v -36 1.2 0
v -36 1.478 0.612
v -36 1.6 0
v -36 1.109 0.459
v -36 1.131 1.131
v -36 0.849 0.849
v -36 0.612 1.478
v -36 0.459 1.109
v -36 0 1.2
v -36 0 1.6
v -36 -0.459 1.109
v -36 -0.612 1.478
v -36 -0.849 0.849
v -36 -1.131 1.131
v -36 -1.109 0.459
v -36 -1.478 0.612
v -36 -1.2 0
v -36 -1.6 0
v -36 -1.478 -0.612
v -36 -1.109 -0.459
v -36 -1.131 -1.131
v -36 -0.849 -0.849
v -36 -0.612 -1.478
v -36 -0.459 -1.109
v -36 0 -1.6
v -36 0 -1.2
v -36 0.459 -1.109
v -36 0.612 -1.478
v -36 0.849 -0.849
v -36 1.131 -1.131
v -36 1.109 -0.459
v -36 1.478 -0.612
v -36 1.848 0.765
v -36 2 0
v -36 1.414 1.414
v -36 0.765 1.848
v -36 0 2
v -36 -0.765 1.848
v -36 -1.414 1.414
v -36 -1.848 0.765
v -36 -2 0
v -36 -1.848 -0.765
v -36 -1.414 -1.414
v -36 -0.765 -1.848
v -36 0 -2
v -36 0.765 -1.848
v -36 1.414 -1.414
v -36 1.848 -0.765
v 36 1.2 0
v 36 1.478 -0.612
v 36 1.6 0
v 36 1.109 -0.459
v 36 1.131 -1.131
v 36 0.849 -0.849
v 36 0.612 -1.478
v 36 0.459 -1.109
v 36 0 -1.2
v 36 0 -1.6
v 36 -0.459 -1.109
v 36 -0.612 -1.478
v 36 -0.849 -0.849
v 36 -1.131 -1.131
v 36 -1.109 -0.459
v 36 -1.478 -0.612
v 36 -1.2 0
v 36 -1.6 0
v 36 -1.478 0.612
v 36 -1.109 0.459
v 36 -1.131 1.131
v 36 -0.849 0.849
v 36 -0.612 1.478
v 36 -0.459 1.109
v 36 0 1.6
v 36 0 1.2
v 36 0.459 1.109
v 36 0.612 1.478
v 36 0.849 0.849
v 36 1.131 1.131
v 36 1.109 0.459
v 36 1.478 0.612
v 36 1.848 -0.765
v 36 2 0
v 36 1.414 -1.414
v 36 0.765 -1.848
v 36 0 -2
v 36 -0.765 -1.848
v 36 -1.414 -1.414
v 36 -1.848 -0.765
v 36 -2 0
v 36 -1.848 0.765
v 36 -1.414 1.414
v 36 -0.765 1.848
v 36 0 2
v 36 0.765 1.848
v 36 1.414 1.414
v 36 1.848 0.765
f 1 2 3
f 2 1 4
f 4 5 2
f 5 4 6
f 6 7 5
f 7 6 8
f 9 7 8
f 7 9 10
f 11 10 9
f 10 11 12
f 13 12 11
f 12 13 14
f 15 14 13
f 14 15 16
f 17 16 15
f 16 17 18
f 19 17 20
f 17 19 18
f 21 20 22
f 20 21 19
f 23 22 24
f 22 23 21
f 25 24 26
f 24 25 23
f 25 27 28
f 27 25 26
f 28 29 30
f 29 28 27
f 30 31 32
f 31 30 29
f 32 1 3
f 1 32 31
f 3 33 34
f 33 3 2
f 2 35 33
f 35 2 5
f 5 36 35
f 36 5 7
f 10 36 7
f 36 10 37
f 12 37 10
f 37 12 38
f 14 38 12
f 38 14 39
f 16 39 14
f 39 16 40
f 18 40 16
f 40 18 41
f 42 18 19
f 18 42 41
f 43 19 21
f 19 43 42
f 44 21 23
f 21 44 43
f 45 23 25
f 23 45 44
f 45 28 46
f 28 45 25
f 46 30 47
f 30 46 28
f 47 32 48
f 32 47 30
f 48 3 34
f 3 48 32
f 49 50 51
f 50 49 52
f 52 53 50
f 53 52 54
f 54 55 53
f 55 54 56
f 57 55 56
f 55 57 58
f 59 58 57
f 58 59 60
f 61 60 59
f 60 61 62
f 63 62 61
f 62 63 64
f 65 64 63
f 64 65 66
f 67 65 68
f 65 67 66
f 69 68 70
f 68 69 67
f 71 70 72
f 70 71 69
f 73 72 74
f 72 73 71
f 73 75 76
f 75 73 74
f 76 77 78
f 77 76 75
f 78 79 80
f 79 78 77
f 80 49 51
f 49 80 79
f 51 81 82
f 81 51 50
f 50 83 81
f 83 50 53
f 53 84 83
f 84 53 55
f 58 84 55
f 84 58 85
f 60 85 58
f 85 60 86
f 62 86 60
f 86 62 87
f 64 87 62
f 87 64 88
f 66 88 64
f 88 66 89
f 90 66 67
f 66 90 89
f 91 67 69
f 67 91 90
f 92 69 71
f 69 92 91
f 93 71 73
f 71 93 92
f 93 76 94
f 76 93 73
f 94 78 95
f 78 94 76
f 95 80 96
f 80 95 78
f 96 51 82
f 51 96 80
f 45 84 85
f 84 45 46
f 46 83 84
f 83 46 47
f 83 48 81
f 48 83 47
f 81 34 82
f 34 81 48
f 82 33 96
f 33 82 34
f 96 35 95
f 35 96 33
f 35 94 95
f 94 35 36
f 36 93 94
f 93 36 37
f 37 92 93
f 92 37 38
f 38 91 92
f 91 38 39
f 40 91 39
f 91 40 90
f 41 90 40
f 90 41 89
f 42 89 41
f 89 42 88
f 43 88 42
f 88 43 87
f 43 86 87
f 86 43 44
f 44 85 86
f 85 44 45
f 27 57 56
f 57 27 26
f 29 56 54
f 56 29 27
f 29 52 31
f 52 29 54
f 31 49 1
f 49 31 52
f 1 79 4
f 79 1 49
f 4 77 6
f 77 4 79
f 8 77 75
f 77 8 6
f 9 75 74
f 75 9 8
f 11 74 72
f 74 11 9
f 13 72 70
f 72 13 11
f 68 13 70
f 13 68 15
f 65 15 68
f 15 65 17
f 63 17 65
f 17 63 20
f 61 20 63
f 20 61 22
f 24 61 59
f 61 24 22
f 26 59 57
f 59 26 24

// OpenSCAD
// file: ../p/4-4disc.scad
use <../lib.scad>
$fa=1; $fs=0.2;
function ldraw_lib__4_4disc(realsolid=false) = [
// 0 Disc 1.0
// 0 Name: 4-4disc.dat
// 0 Author: James Jessiman
// 0 !LDRAW_ORG Primitive UPDATE 2002-02
// 0 !LICENSE Licensed under CC BY 2.0 and CC BY 4.0 : see CAreadme.txt
// 
// 0 BFC CERTIFY CCW
  [0,"BFC","CERTIFY"],
  [0,"BFC","CCW"],
// 
// 0 !HISTORY 1998-12-15 [PTadmin] Official Update 1998-10
// 0 !HISTORY 2002-03-23 [sbliss] Added BFC statement
// 0 !HISTORY 2002-04-25 [PTadmin] Official Update 2002-02
// 0 !HISTORY 2007-06-24 [PTadmin] Header formatted for Contributor Agreement
// 0 !HISTORY 2008-07-01 [PTadmin] Official Update 2008-01
// 
// 
// 3 16 0 0 0 1 0 0 0.9239 0 0.3827
  [3,16,0,0,0,1,0,0,0.9239,0,0.3827],
// 3 16 0 0 0 0.9239 0 0.3827 0.7071 0 0.7071
  [3,16,0,0,0,0.9239,0,0.3827,0.7071,0,0.7071],
// 3 16 0 0 0 0.7071 0 0.7071 0.3827 0 0.9239
  [3,16,0,0,0,0.7071,0,0.7071,0.3827,0,0.9239],
// 3 16 0 0 0 0.3827 0 0.9239 0 0 1
  [3,16,0,0,0,0.3827,0,0.9239,0,0,1],
// 3 16 0 0 0 0 0 1 -0.3827 0 0.9239
  [3,16,0,0,0,0,0,1,-0.3827,0,0.9239],
// 3 16 0 0 0 -0.3827 0 0.9239 -0.7071 0 0.7071
  [3,16,0,0,0,-0.3827,0,0.9239,-0.7071,0,0.7071],
// 3 16 0 0 0 -0.7071 0 0.7071 -0.9239 0 0.3827
  [3,16,0,0,0,-0.7071,0,0.7071,-0.9239,0,0.3827],
// 3 16 0 0 0 -0.9239 0 0.3827 -1 0 -0
  [3,16,0,0,0,-0.9239,0,0.3827,-1,0,-0],
// 3 16 0 0 0 -1 0 -0 -0.9239 0 -0.3827
  [3,16,0,0,0,-1,0,-0,-0.9239,0,-0.3827],
// 3 16 0 0 0 -0.9239 0 -0.3827 -0.7071 0 -0.7071
  [3,16,0,0,0,-0.9239,0,-0.3827,-0.7071,0,-0.7071],
// 3 16 0 0 0 -0.7071 0 -0.7071 -0.3827 0 -0.9239
  [3,16,0,0,0,-0.7071,0,-0.7071,-0.3827,0,-0.9239],
// 3 16 0 0 0 -0.3827 0 -0.9239 0 0 -1
  [3,16,0,0,0,-0.3827,0,-0.9239,0,0,-1],
// 3 16 0 0 0 0 0 -1 0.3827 0 -0.9239
  [3,16,0,0,0,0,0,-1,0.3827,0,-0.9239],
// 3 16 0 0 0 0.3827 0 -0.9239 0.7071 0 -0.7071
  [3,16,0,0,0,0.3827,0,-0.9239,0.7071,0,-0.7071],
// 3 16 0 0 0 0.7071 0 -0.7071 0.9239 0 -0.3827
  [3,16,0,0,0,0.7071,0,-0.7071,0.9239,0,-0.3827],
// 3 16 0 0 0 0.9239 0 -0.3827 1 0 0
  [3,16,0,0,0,0.9239,0,-0.3827,1,0,0],
// 0
];
module ldraw_lib__4_4disc(step=0, col=false, unit=2/5, alt=false, line=0.2, solid=!$preview)
    makepoly(ldraw_lib__4_4disc(solid), step=step, col=col, unit=unit, alt=alt, line=line, solid=solid);
ldraw_lib__4_4disc(line=0.2);
// file: ../p/stud3.scad
use <../lib.scad>
use <4-4cyli.scad>
use <4-4disc.scad>
use <4-4edge.scad>
$fa=1; $fs=0.2;
function ldraw_lib__stud3(realsolid=false) = realsolid ? 
    [openscad(translate([0,0,-eps()], o=cylinder(4+eps(), r=4)),2)] : [
// 0 Stud Tube Solid
// 0 Name: stud3.dat
// 0 Author: James Jessiman
// 0 !LDRAW_ORG Primitive UPDATE 2012-01
// 0 !LICENSE Licensed under CC BY 2.0 and CC BY 4.0 : see CAreadme.txt
// 
// 0 BFC CERTIFY CCW
  [0,"BFC","CERTIFY"],
  [0,"BFC","CCW"],
// 
// 0 !HISTORY 2002-04-04 [sbliss] Modified for BFC compliance
// 0 !HISTORY 2002-04-25 [PTadmin] Official Update 2002-02
// 0 !HISTORY 2007-06-24 [PTadmin] Header formatted for Contributor Agreement
// 0 !HISTORY 2008-07-01 [PTadmin] Official Update 2008-01
// 0 !HISTORY 2012-02-16 [Philo] Changed to CCW
// 0 !HISTORY 2012-03-30 [PTadmin] Official Update 2012-01
// 
// 
// 1 16 0 -4 0 4 0 0 0 1 0 0 0 4 4-4edge.dat
  [1,16,0,-4,0,4,0,0,0,1,0,0,0,4, ldraw_lib__4_4edge(realsolid)],
// 1 16 0 0 0 4 0 0 0 1 0 0 0 4 4-4edge.dat
  [1,16,0,0,0,4,0,0,0,1,0,0,0,4, ldraw_lib__4_4edge(realsolid)],
// 1 16 0 -4 0 4 0 0 0 1 0 0 0 4 4-4disc.dat
  [1,16,0,-4,0,4,0,0,0,1,0,0,0,4, ldraw_lib__4_4disc(realsolid)],
// 1 16 0 -4 0 4 0 0 0 4 0 0 0 4 4-4cyli.dat
  [1,16,0,-4,0,4,0,0,0,4,0,0,0,4, ldraw_lib__4_4cyli(realsolid)],
];
module ldraw_lib__stud3(step=0, col=false, unit=2/5, alt=false, line=0.2, solid=!$preview)
    makepoly(ldraw_lib__stud3(solid), step=step, col=col, unit=unit, alt=alt, line=line, solid=solid);
ldraw_lib__stud3(line=0.2);
// file: ../p/stud.scad
use <../lib.scad>
use <4-4cyli.scad>
use <4-4disc.scad>
use <4-4edge.scad>
$fa=1; $fs=0.2;
function ldraw_lib__stud(realsolid=false) = realsolid ? 
    [openscad(translate([0,0,-eps()], o=cylinder(4+eps(), r=6)),2)] : [
// 0 Stud
// 0 Name: stud.dat
// 0 Author: James Jessiman
// 0 !LDRAW_ORG Primitive UPDATE 2012-01
// 0 !LICENSE Licensed under CC BY 2.0 and CC BY 4.0 : see CAreadme.txt
// 
// 0 BFC CERTIFY CCW
  [0,"BFC","CERTIFY"],
  [0,"BFC","CCW"],
// 
// 0 !HISTORY 2002-04-04 [sbliss] Modified for BFC compliance
// 0 !HISTORY 2002-04-25 [PTadmin] Official Update 2002-02
// 0 !HISTORY 2007-06-24 [PTadmin] Header formatted for Contributor Agreement
// 0 !HISTORY 2008-07-01 [PTadmin] Official Update 2008-01
// 0 !HISTORY 2012-02-16 [Philo] Changed to CCW
// 0 !HISTORY 2012-03-30 [PTadmin] Official Update 2012-01
// 
// 
// 1 16 0 0 0 6 0 0 0 1 0 0 0 6 4-4edge.dat
  [1,16,0,0,0,6,0,0,0,1,0,0,0,6, ldraw_lib__4_4edge(realsolid)],
// 1 16 0 -4 0 6 0 0 0 1 0 0 0 6 4-4edge.dat
  [1,16,0,-4,0,6,0,0,0,1,0,0,0,6, ldraw_lib__4_4edge(realsolid)],
// 1 16 0 0 0 6 0 0 0 -4 0 0 0 6 4-4cyli.dat
  [1,16,0,0,0,6,0,0,0,-4,0,0,0,6, ldraw_lib__4_4cyli(realsolid)],
// 1 16 0 -4 0 6 0 0 0 1 0 0 0 6 4-4disc.dat
  [1,16,0,-4,0,6,0,0,0,1,0,0,0,6, ldraw_lib__4_4disc(realsolid)],
];
module ldraw_lib__stud(step=0, col=false, unit=2/5, alt=false, line=0.2, solid=!$preview)
    makepoly(ldraw_lib__stud(solid), step=step, col=col, unit=unit, alt=alt, line=line, solid=solid);
ldraw_lib__stud(line=0.2);
// file: ../p/box5.scad
use <../lib.scad>
$fa=1; $fs=0.2;
function ldraw_lib__box5(realsolid=false) = [
// 0 Box with 5 Faces and All Edges
// 0 Name: box5.dat
// 0 Author: James Jessiman
// 0 !LDRAW_ORG Primitive UPDATE 2012-01
// 0 !LICENSE Licensed under CC BY 2.0 and CC BY 4.0 : see CAreadme.txt
// 
// 0 BFC CERTIFY CCW
  [0,"BFC","CERTIFY"],
  [0,"BFC","CCW"],
// 
// 0 !HISTORY 2002-04-03 [sbliss] Modified for BFC compliance
// 0 !HISTORY 2002-04-25 [PTadmin] Official Update 2002-02
// 0 !HISTORY 2007-06-24 [PTadmin] Header formatted for Contributor Agreement
// 0 !HISTORY 2008-07-01 [PTadmin] Official Update 2008-01
// 0 !HISTORY 2012-02-16 [Philo] Changed to CCW
// 0 !HISTORY 2012-03-30 [PTadmin] Official Update 2012-01
// 
// 
// 2 24 1 1 1 -1 1 1
  [2,24,1,1,1,-1,1,1],
// 2 24 -1 1 1 -1 1 -1
  [2,24,-1,1,1,-1,1,-1],
// 2 24 -1 1 -1 1 1 -1
  [2,24,-1,1,-1,1,1,-1],
// 2 24 1 1 -1 1 1 1
  [2,24,1,1,-1,1,1,1],
// 2 24 1 0 1 -1 0 1
  [2,24,1,0,1,-1,0,1],
// 2 24 -1 0 1 -1 0 -1
  [2,24,-1,0,1,-1,0,-1],
// 2 24 -1 0 -1 1 0 -1
  [2,24,-1,0,-1,1,0,-1],
// 2 24 1 0 -1 1 0 1
  [2,24,1,0,-1,1,0,1],
// 2 24 1 0 1 1 1 1
  [2,24,1,0,1,1,1,1],
// 2 24 -1 0 1 -1 1 1
  [2,24,-1,0,1,-1,1,1],
// 2 24 1 0 -1 1 1 -1
  [2,24,1,0,-1,1,1,-1],
// 2 24 -1 0 -1 -1 1 -1
  [2,24,-1,0,-1,-1,1,-1],
// 4 16 -1 1 1 1 1 1 1 1 -1 -1 1 -1
  [4,16,-1,1,1,1,1,1,1,1,-1,-1,1,-1],
// 4 16 -1 1 1 -1 0 1 1 0 1 1 1 1
  [4,16,-1,1,1,-1,0,1,1,0,1,1,1,1],
// 4 16 -1 1 -1 -1 0 -1 -1 0 1 -1 1 1
  [4,16,-1,1,-1,-1,0,-1,-1,0,1,-1,1,1],
// 4 16 1 1 -1 1 0 -1 -1 0 -1 -1 1 -1
  [4,16,1,1,-1,1,0,-1,-1,0,-1,-1,1,-1],
// 4 16 1 1 1 1 0 1 1 0 -1 1 1 -1
  [4,16,1,1,1,1,0,1,1,0,-1,1,1,-1],
];
module ldraw_lib__box5(step=0, col=false, unit=2/5, alt=false, line=0.2, solid=!$preview)
    makepoly(ldraw_lib__box5(solid), step=step, col=col, unit=unit, alt=alt, line=line, solid=solid);
ldraw_lib__box5(line=0.2);
// file: ../p/box4t.scad
use <../lib.scad>
$fa=1; $fs=0.2;
function ldraw_lib__box4t(realsolid=false) = [
// 0 Box with 4 Adjacent Faces and All Edges
// 0 Name: box4t.dat
// 0 Author: Tore Eriksson [Tore_Eriksson]
// 0 !LDRAW_ORG Primitive UPDATE 2003-02
// 0 !LICENSE Licensed under CC BY 2.0 and CC BY 4.0 : see CAreadme.txt
// 
// 0 BFC CERTIFY CCW
  [0,"BFC","CERTIFY"],
  [0,"BFC","CCW"],
// 
// 0 !HISTORY 1997-09-29 [PTadmin] Official Update 1997-15
// 0 !HISTORY 2002-08-31 [izanette] Modified with WINDZ for BFC compliance
// 0 !HISTORY 2003-08-01 [PTadmin] Official Update 2003-02
// 0 !HISTORY 2007-06-24 [PTadmin] Header formatted for Contributor Agreement
// 0 !HISTORY 2008-07-01 [PTadmin] Official Update 2008-01
// 
// 
// 2 24 1 1 1 -1 1 1
  [2,24,1,1,1,-1,1,1],
// 2 24 -1 1 1 -1 1 -1
  [2,24,-1,1,1,-1,1,-1],
// 2 24 -1 1 -1 1 1 -1
  [2,24,-1,1,-1,1,1,-1],
// 2 24 1 1 -1 1 1 1
  [2,24,1,1,-1,1,1,1],
// 2 24 1 0 1 -1 0 1
  [2,24,1,0,1,-1,0,1],
// 2 24 -1 0 1 -1 0 -1
  [2,24,-1,0,1,-1,0,-1],
// 2 24 -1 0 -1 1 0 -1
  [2,24,-1,0,-1,1,0,-1],
// 2 24 1 0 -1 1 0 1
  [2,24,1,0,-1,1,0,1],
// 2 24 1 0 1 1 1 1
  [2,24,1,0,1,1,1,1],
// 2 24 -1 0 1 -1 1 1
  [2,24,-1,0,1,-1,1,1],
// 2 24 1 0 -1 1 1 -1
  [2,24,1,0,-1,1,1,-1],
// 2 24 -1 0 -1 -1 1 -1
  [2,24,-1,0,-1,-1,1,-1],
// 4 16 1 1 1 1 1 -1 -1 1 -1 -1 1 1
  [4,16,1,1,1,1,1,-1,-1,1,-1,-1,1,1],
// 4 16 1 1 1 -1 1 1 -1 0 1 1 0 1
  [4,16,1,1,1,-1,1,1,-1,0,1,1,0,1],
// 4 16 -1 1 1 -1 1 -1 -1 0 -1 -1 0 1
  [4,16,-1,1,1,-1,1,-1,-1,0,-1,-1,0,1],
// 0 4 16 -1 1 -1 -1 0 -1 1 0 -1 1 1 -1
// 4 16 1 1 -1 1 1 1 1 0 1 1 0 -1
  [4,16,1,1,-1,1,1,1,1,0,1,1,0,-1],
// 0
];
module ldraw_lib__box4t(step=0, col=false, unit=2/5, alt=false, line=0.2, solid=!$preview)
    makepoly(ldraw_lib__box4t(solid), step=step, col=col, unit=unit, alt=alt, line=line, solid=solid);
ldraw_lib__box4t(line=0.2);
// file: s/3004s01.scad
use <../../lib.scad>
use <../../p/box4t.scad>
use <../../p/box5.scad>
use <../../p/stud.scad>
use <../../p/stud3.scad>
$fa=1; $fs=0.2;
function ldraw_lib__s__3004s01(realsolid=false) = [
// 0 ~Brick  1 x  2 without Front Face
// 0 Name: s\3004s01.dat
// 0 Author: James Jessiman
// 0 !LDRAW_ORG Subpart UPDATE 2003-03
// 0 !LICENSE Licensed under CC BY 2.0 and CC BY 4.0 : see CAreadme.txt
// 
// 0 BFC CERTIFY CCW
  [0,"BFC","CERTIFY"],
  [0,"BFC","CCW"],
// 
// 0 !HISTORY 2003-09-07 [jriley] Subfiling, BFC
// 0 !HISTORY 2003-12-19 [PTadmin] Official Update 2003-03
// 0 !HISTORY 2007-08-29 [PTadmin] Header formatted for Contributor Agreement
// 0 !HISTORY 2008-07-01 [PTadmin] Official Update 2008-01
// 
// 
// 1 16 0 4 0 1 0 0 0 -5 0 0 0 1 stud3.dat
  [1,16,0,4,0,1,0,0,0,-5,0,0,0,1, ldraw_lib__stud3(realsolid)],
// 0 BFC INVERTNEXT
  [0,"BFC","INVERTNEXT"],
// 1 16 0 24 0 16 0 0 0 -20 0 0 0 6 box5.dat
  [1,16,0,24,0,16,0,0,0,-20,0,0,0,6, ldraw_lib__box5(realsolid)],
// 4 16 20 24 10 16 24 6 -16 24 6 -20 24 10
  [4,16,20,24,10,16,24,6,-16,24,6,-20,24,10],
// 4 16 -20 24 10 -16 24 6 -16 24 -6 -20 24 -10
  [4,16,-20,24,10,-16,24,6,-16,24,-6,-20,24,-10],
// 4 16 -20 24 -10 -16 24 -6 16 24 -6 20 24 -10
  [4,16,-20,24,-10,-16,24,-6,16,24,-6,20,24,-10],
// 4 16 20 24 -10 16 24 -6 16 24 6 20 24 10
  [4,16,20,24,-10,16,24,-6,16,24,6,20,24,10],
// 1 16 0 24 0 20 0 0 0 -24 0 0 0 10 box4t.dat
  [1,16,0,24,0,20,0,0,0,-24,0,0,0,10, ldraw_lib__box4t(realsolid)],
// 1 16 10 0 0 1 0 0 0 1 0 0 0 1 stud.dat
  [1,16,10,0,0,1,0,0,0,1,0,0,0,1, ldraw_lib__stud(realsolid)],
// 1 16 -10 0 0 1 0 0 0 1 0 0 0 1 stud.dat
  [1,16,-10,0,0,1,0,0,0,1,0,0,0,1, ldraw_lib__stud(realsolid)],
// 0
];
module ldraw_lib__s__3004s01(step=0, col=false, unit=2/5, alt=false, line=0.2, solid=!$preview)
    makepoly(ldraw_lib__s__3004s01(solid), step=step, col=col, unit=unit, alt=alt, line=line, solid=solid);
ldraw_lib__s__3004s01(line=0.2);
// file: ../p/4-4cyli.scad
use <../lib.scad>
$fa=1; $fs=0.2;
function ldraw_lib__4_4cyli(realsolid=false) = [
// 0 Cylinder 1.0
// 0 Name: 4-4cyli.dat
// 0 Author: James Jessiman
// 0 !LDRAW_ORG Primitive UPDATE 2005-01
// 0 !LICENSE Licensed under CC BY 2.0 and CC BY 4.0 : see CAreadme.txt
// 
// 0 BFC CERTIFY CCW
  [0,"BFC","CERTIFY"],
  [0,"BFC","CCW"],
// 
// 0 !HISTORY 1998-12-15 [PTadmin] Official Update 1998-10
// 0 !HISTORY 2002-03-23 [sbliss] Added BFC statement; merged headers from files in distributions LDraw 0.27 and Complete.
// 0 !HISTORY 2002-04-25 [PTadmin] Official Update 2002-02
// 0 !HISTORY 2004-12-14 [guyvivan] BFC CCW
// 0 !HISTORY 2005-12-28 [PTadmin] Official Update 2005-01
// 0 !HISTORY 2007-06-24 [PTadmin] Header formatted for Contributor Agreement
// 0 !HISTORY 2008-07-01 [PTadmin] Official Update 2008-01
// 
// 
// 4 16 1 1 0 0.9239 1 0.3827 0.9239 0 0.3827 1 0 0
  [4,16,1,1,0,0.9239,1,0.3827,0.9239,0,0.3827,1,0,0],
// 5 24 1 0 0 1 1 0 0.9239 0 0.3827 0.9239 0 -0.3827
  [5,24,1,0,0,1,1,0,0.9239,0,0.3827,0.9239,0,-0.3827],
// 4 16 0.9239 1 0.3827 0.7071 1 0.7071 0.7071 0 0.7071 0.9239 0 0.3827
  [4,16,0.9239,1,0.3827,0.7071,1,0.7071,0.7071,0,0.7071,0.9239,0,0.3827],
// 5 24 0.9239 0 0.3827 0.9239 1 0.3827 0.7071 0 0.7071 1 0 0
  [5,24,0.9239,0,0.3827,0.9239,1,0.3827,0.7071,0,0.7071,1,0,0],
// 4 16 0.7071 1 0.7071 0.3827 1 0.9239 0.3827 0 0.9239 0.7071 0 0.7071
  [4,16,0.7071,1,0.7071,0.3827,1,0.9239,0.3827,0,0.9239,0.7071,0,0.7071],
// 5 24 0.7071 0 0.7071 0.7071 1 0.7071 0.3827 0 0.9239 0.9239 0 0.3827
  [5,24,0.7071,0,0.7071,0.7071,1,0.7071,0.3827,0,0.9239,0.9239,0,0.3827],
// 4 16 0.3827 1 0.9239 0 1 1 0 0 1 0.3827 0 0.9239
  [4,16,0.3827,1,0.9239,0,1,1,0,0,1,0.3827,0,0.9239],
// 5 24 0.3827 0 0.9239 0.3827 1 0.9239 0 0 1 0.7071 0 0.7071
  [5,24,0.3827,0,0.9239,0.3827,1,0.9239,0,0,1,0.7071,0,0.7071],
// 4 16 0 1 1 -0.3827 1 0.9239 -0.3827 0 0.9239 0 0 1
  [4,16,0,1,1,-0.3827,1,0.9239,-0.3827,0,0.9239,0,0,1],
// 5 24 0 0 1 0 1 1 -0.3827 0 0.9239 0.3827 0 0.9239
  [5,24,0,0,1,0,1,1,-0.3827,0,0.9239,0.3827,0,0.9239],
// 4 16 -0.3827 1 0.9239 -0.7071 1 0.7071 -0.7071 0 0.7071 -0.3827 0 0.9239
  [4,16,-0.3827,1,0.9239,-0.7071,1,0.7071,-0.7071,0,0.7071,-0.3827,0,0.9239],
// 5 24 -0.3827 0 0.9239 -0.3827 1 0.9239 -0.7071 0 0.7071 0 0 1
  [5,24,-0.3827,0,0.9239,-0.3827,1,0.9239,-0.7071,0,0.7071,0,0,1],
// 4 16 -0.7071 1 0.7071 -0.9239 1 0.3827 -0.9239 0 0.3827 -0.7071 0 0.7071
  [4,16,-0.7071,1,0.7071,-0.9239,1,0.3827,-0.9239,0,0.3827,-0.7071,0,0.7071],
// 5 24 -0.7071 0 0.7071 -0.7071 1 0.7071 -0.9239 0 0.3827 -0.3827 0 0.9239
  [5,24,-0.7071,0,0.7071,-0.7071,1,0.7071,-0.9239,0,0.3827,-0.3827,0,0.9239],
// 4 16 -0.9239 1 0.3827 -1 1 0 -1 0 0 -0.9239 0 0.3827
  [4,16,-0.9239,1,0.3827,-1,1,0,-1,0,0,-0.9239,0,0.3827],
// 5 24 -0.9239 0 0.3827 -0.9239 1 0.3827 -1 0 0 -0.7071 0 0.7071
  [5,24,-0.9239,0,0.3827,-0.9239,1,0.3827,-1,0,0,-0.7071,0,0.7071],
// 4 16 -1 1 0 -0.9239 1 -0.3827 -0.9239 0 -0.3827 -1 0 0
  [4,16,-1,1,0,-0.9239,1,-0.3827,-0.9239,0,-0.3827,-1,0,0],
// 5 24 -1 0 0 -1 1 0 -0.9239 0 -0.3827 -0.9239 0 0.3827
  [5,24,-1,0,0,-1,1,0,-0.9239,0,-0.3827,-0.9239,0,0.3827],
// 4 16 -0.9239 1 -0.3827 -0.7071 1 -0.7071 -0.7071 0 -0.7071 -0.9239 0 -0.3827
  [4,16,-0.9239,1,-0.3827,-0.7071,1,-0.7071,-0.7071,0,-0.7071,-0.9239,0,-0.3827],
// 5 24 -0.9239 0 -0.3827 -0.9239 1 -0.3827 -0.7071 0 -0.7071 -1 0 0
  [5,24,-0.9239,0,-0.3827,-0.9239,1,-0.3827,-0.7071,0,-0.7071,-1,0,0],
// 4 16 -0.7071 1 -0.7071 -0.3827 1 -0.9239 -0.3827 0 -0.9239 -0.7071 0 -0.7071
  [4,16,-0.7071,1,-0.7071,-0.3827,1,-0.9239,-0.3827,0,-0.9239,-0.7071,0,-0.7071],
// 5 24 -0.7071 0 -0.7071 -0.7071 1 -0.7071 -0.3827 0 -0.9239 -0.9239 0 -0.3827
  [5,24,-0.7071,0,-0.7071,-0.7071,1,-0.7071,-0.3827,0,-0.9239,-0.9239,0,-0.3827],
// 4 16 -0.3827 1 -0.9239 0 1 -1 0 0 -1 -0.3827 0 -0.9239
  [4,16,-0.3827,1,-0.9239,0,1,-1,0,0,-1,-0.3827,0,-0.9239],
// 5 24 -0.3827 0 -0.9239 -0.3827 1 -0.9239 0 0 -1 -0.7071 0 -0.7071
  [5,24,-0.3827,0,-0.9239,-0.3827,1,-0.9239,0,0,-1,-0.7071,0,-0.7071],
// 4 16 0 1 -1 0.3827 1 -0.9239 0.3827 0 -0.9239 0 0 -1
  [4,16,0,1,-1,0.3827,1,-0.9239,0.3827,0,-0.9239,0,0,-1],
// 5 24 0 0 -1 0 1 -1 0.3827 0 -0.9239 -0.3827 0 -0.9239
  [5,24,0,0,-1,0,1,-1,0.3827,0,-0.9239,-0.3827,0,-0.9239],
// 4 16 0.3827 1 -0.9239 0.7071 1 -0.7071 0.7071 0 -0.7071 0.3827 0 -0.9239
  [4,16,0.3827,1,-0.9239,0.7071,1,-0.7071,0.7071,0,-0.7071,0.3827,0,-0.9239],
// 5 24 0.3827 0 -0.9239 0.3827 1 -0.9239 0.7071 0 -0.7071 0 0 -1
  [5,24,0.3827,0,-0.9239,0.3827,1,-0.9239,0.7071,0,-0.7071,0,0,-1],
// 4 16 0.7071 1 -0.7071 0.9239 1 -0.3827 0.9239 0 -0.3827 0.7071 0 -0.7071
  [4,16,0.7071,1,-0.7071,0.9239,1,-0.3827,0.9239,0,-0.3827,0.7071,0,-0.7071],
// 5 24 0.7071 0 -0.7071 0.7071 1 -0.7071 0.9239 0 -0.3827 0.3827 0 -0.9239
  [5,24,0.7071,0,-0.7071,0.7071,1,-0.7071,0.9239,0,-0.3827,0.3827,0,-0.9239],
// 4 16 0.9239 1 -0.3827 1 1 0 1 0 0 0.9239 0 -0.3827
  [4,16,0.9239,1,-0.3827,1,1,0,1,0,0,0.9239,0,-0.3827],
// 5 24 0.9239 0 -0.3827 0.9239 1 -0.3827 1 0 0 0.7071 0 -0.7071
  [5,24,0.9239,0,-0.3827,0.9239,1,-0.3827,1,0,0,0.7071,0,-0.7071],
// 0
];
module ldraw_lib__4_4cyli(step=0, col=false, unit=2/5, alt=false, line=0.2, solid=!$preview)
    makepoly(ldraw_lib__4_4cyli(solid), step=step, col=col, unit=unit, alt=alt, line=line, solid=solid);
ldraw_lib__4_4cyli(line=0.2);
// file: ../p/4-4ring4.scad
use <../lib.scad>
$fa=1; $fs=0.2;
function ldraw_lib__4_4ring4(realsolid=false) = [
// 0 Ring  4 x 1.0
// 0 Name: 4-4ring4.dat
// 0 Author: James Jessiman
// 0 !LDRAW_ORG Primitive UPDATE 2009-01
// 0 !LICENSE Licensed under CC BY 2.0 and CC BY 4.0 : see CAreadme.txt
// 
// 0 BFC CERTIFY CCW
  [0,"BFC","CERTIFY"],
  [0,"BFC","CCW"],
// 
// 0 !HISTORY 1998-12-15 [PTadmin] Official Update 1998-10
// 0 !HISTORY 2002-04-08 [BrickCaster] Modified for BFC compliance
// 0 !HISTORY 2002-04-25 [PTadmin] Official Update 2002-02
// 0 !HISTORY 2007-06-24 [PTadmin] Header formatted for Contributor Agreement
// 0 !HISTORY 2008-07-01 [PTadmin] Official Update 2008-01
// 0 !HISTORY 2008-08-26 [cwdee] Switch polygon winding and rename
// 0 !HISTORY 2009-05-02 [PTadmin] Official Update 2009-01
// 
// 
// 4 16 -1.9135 0 4.6195 -1.5308 0 3.6956 0 0 4 0 0 5
  [4,16,-1.9135,0,4.6195,-1.5308,0,3.6956,0,0,4,0,0,5],
// 4 16 -3.5355 0 3.5355 -2.8284 0 2.8284 -1.5308 0 3.6956 -1.9135 0 4.6195
  [4,16,-3.5355,0,3.5355,-2.8284,0,2.8284,-1.5308,0,3.6956,-1.9135,0,4.6195],
// 4 16 -4.6195 0 1.9135 -3.6956 0 1.5308 -2.8284 0 2.8284 -3.5355 0 3.5355
  [4,16,-4.6195,0,1.9135,-3.6956,0,1.5308,-2.8284,0,2.8284,-3.5355,0,3.5355],
// 4 16 -5 0 0 -4 0 0 -3.6956 0 1.5308 -4.6195 0 1.9135
  [4,16,-5,0,0,-4,0,0,-3.6956,0,1.5308,-4.6195,0,1.9135],
// 4 16 -4.6195 0 -1.9135 -3.6956 0 -1.5308 -4 0 0 -5 0 0
  [4,16,-4.6195,0,-1.9135,-3.6956,0,-1.5308,-4,0,0,-5,0,0],
// 4 16 -3.5355 0 -3.5355 -2.8284 0 -2.8284 -3.6956 0 -1.5308 -4.6195 0 -1.9135
  [4,16,-3.5355,0,-3.5355,-2.8284,0,-2.8284,-3.6956,0,-1.5308,-4.6195,0,-1.9135],
// 4 16 -1.9135 0 -4.6195 -1.5308 0 -3.6956 -2.8284 0 -2.8284 -3.5355 0 -3.5355
  [4,16,-1.9135,0,-4.6195,-1.5308,0,-3.6956,-2.8284,0,-2.8284,-3.5355,0,-3.5355],
// 4 16 0 0 -5 0 0 -4 -1.5308 0 -3.6956 -1.9135 0 -4.6195
  [4,16,0,0,-5,0,0,-4,-1.5308,0,-3.6956,-1.9135,0,-4.6195],
// 4 16 1.9135 0 -4.6195 1.5308 0 -3.6956 0 0 -4 0 0 -5
  [4,16,1.9135,0,-4.6195,1.5308,0,-3.6956,0,0,-4,0,0,-5],
// 4 16 3.5355 0 -3.5355 2.8284 0 -2.8284 1.5308 0 -3.6956 1.9135 0 -4.6195
  [4,16,3.5355,0,-3.5355,2.8284,0,-2.8284,1.5308,0,-3.6956,1.9135,0,-4.6195],
// 4 16 4.6195 0 -1.9135 3.6956 0 -1.5308 2.8284 0 -2.8284 3.5355 0 -3.5355
  [4,16,4.6195,0,-1.9135,3.6956,0,-1.5308,2.8284,0,-2.8284,3.5355,0,-3.5355],
// 4 16 5 0 0 4 0 0 3.6956 0 -1.5308 4.6195 0 -1.9135
  [4,16,5,0,0,4,0,0,3.6956,0,-1.5308,4.6195,0,-1.9135],
// 4 16 4.6195 0 1.9135 3.6956 0 1.5308 4 0 0 5 0 0
  [4,16,4.6195,0,1.9135,3.6956,0,1.5308,4,0,0,5,0,0],
// 4 16 3.5355 0 3.5355 2.8284 0 2.8284 3.6956 0 1.5308 4.6195 0 1.9135
  [4,16,3.5355,0,3.5355,2.8284,0,2.8284,3.6956,0,1.5308,4.6195,0,1.9135],
// 4 16 1.9135 0 4.6195 1.5308 0 3.6956 2.8284 0 2.8284 3.5355 0 3.5355
  [4,16,1.9135,0,4.6195,1.5308,0,3.6956,2.8284,0,2.8284,3.5355,0,3.5355],
// 4 16 0 0 5 0 0 4 1.5308 0 3.6956 1.9135 0 4.6195
  [4,16,0,0,5,0,0,4,1.5308,0,3.6956,1.9135,0,4.6195],
// 0
];
module ldraw_lib__4_4ring4(step=0, col=false, unit=2/5, alt=false, line=0.2, solid=!$preview)
    makepoly(ldraw_lib__4_4ring4(solid), step=step, col=col, unit=unit, alt=alt, line=line, solid=solid);
ldraw_lib__4_4ring4(line=0.2);
// file: ../p/4-4ring3.scad
use <../lib.scad>
$fa=1; $fs=0.2;
function ldraw_lib__4_4ring3(realsolid=false) = [
// 0 Ring  3 x 1.0
// 0 Name: 4-4ring3.dat
// 0 Author: James Jessiman
// 0 !LDRAW_ORG Primitive UPDATE 2009-01
// 0 !LICENSE Licensed under CC BY 2.0 and CC BY 4.0 : see CAreadme.txt
// 
// 0 BFC CERTIFY CCW
  [0,"BFC","CERTIFY"],
  [0,"BFC","CCW"],
// 
// 0 !HISTORY 1998-12-15 [PTadmin] Official Update 1998-10
// 0 !HISTORY 2002-04-05 [hafhead] Added BFC statement
// 0 !HISTORY 2002-04-25 [PTadmin] Official Update 2002-02
// 0 !HISTORY 2007-06-24 [PTadmin] Header formatted for Contributor Agreement
// 0 !HISTORY 2008-07-01 [PTadmin] Official Update 2008-01
// 0 !HISTORY 2008-08-26 [cwdee] Switch polygon winding and rename
// 0 !HISTORY 2009-05-02 [PTadmin] Official Update 2009-01
// 
// 
// 4 16 -1.5308 0 3.6956 -1.1481 0 2.7717 0 0 3 0 0 4
  [4,16,-1.5308,0,3.6956,-1.1481,0,2.7717,0,0,3,0,0,4],
// 4 16 -2.8284 0 2.8284 -2.1213 0 2.1213 -1.1481 0 2.7717 -1.5308 0 3.6956
  [4,16,-2.8284,0,2.8284,-2.1213,0,2.1213,-1.1481,0,2.7717,-1.5308,0,3.6956],
// 4 16 -3.6956 0 1.5308 -2.7717 0 1.1481 -2.1213 0 2.1213 -2.8284 0 2.8284
  [4,16,-3.6956,0,1.5308,-2.7717,0,1.1481,-2.1213,0,2.1213,-2.8284,0,2.8284],
// 4 16 -4 0 0 -3 0 0 -2.7717 0 1.1481 -3.6956 0 1.5308
  [4,16,-4,0,0,-3,0,0,-2.7717,0,1.1481,-3.6956,0,1.5308],
// 4 16 -3.6956 0 -1.5308 -2.7717 0 -1.1481 -3 0 0 -4 0 0
  [4,16,-3.6956,0,-1.5308,-2.7717,0,-1.1481,-3,0,0,-4,0,0],
// 4 16 -2.8284 0 -2.8284 -2.1213 0 -2.1213 -2.7717 0 -1.1481 -3.6956 0 -1.5308
  [4,16,-2.8284,0,-2.8284,-2.1213,0,-2.1213,-2.7717,0,-1.1481,-3.6956,0,-1.5308],
// 4 16 -1.5308 0 -3.6956 -1.1481 0 -2.7717 -2.1213 0 -2.1213 -2.8284 0 -2.8284
  [4,16,-1.5308,0,-3.6956,-1.1481,0,-2.7717,-2.1213,0,-2.1213,-2.8284,0,-2.8284],
// 4 16 0 0 -4 0 0 -3 -1.1481 0 -2.7717 -1.5308 0 -3.6956
  [4,16,0,0,-4,0,0,-3,-1.1481,0,-2.7717,-1.5308,0,-3.6956],
// 4 16 1.5308 0 -3.6956 1.1481 0 -2.7717 0 0 -3 0 0 -4
  [4,16,1.5308,0,-3.6956,1.1481,0,-2.7717,0,0,-3,0,0,-4],
// 4 16 2.8284 0 -2.8284 2.1213 0 -2.1213 1.1481 0 -2.7717 1.5308 0 -3.6956
  [4,16,2.8284,0,-2.8284,2.1213,0,-2.1213,1.1481,0,-2.7717,1.5308,0,-3.6956],
// 4 16 3.6956 0 -1.5308 2.7717 0 -1.1481 2.1213 0 -2.1213 2.8284 0 -2.8284
  [4,16,3.6956,0,-1.5308,2.7717,0,-1.1481,2.1213,0,-2.1213,2.8284,0,-2.8284],
// 4 16 4 0 0 3 0 0 2.7717 0 -1.1481 3.6956 0 -1.5308
  [4,16,4,0,0,3,0,0,2.7717,0,-1.1481,3.6956,0,-1.5308],
// 4 16 3.6956 0 1.5308 2.7717 0 1.1481 3 0 0 4 0 0
  [4,16,3.6956,0,1.5308,2.7717,0,1.1481,3,0,0,4,0,0],
// 4 16 2.8284 0 2.8284 2.1213 0 2.1213 2.7717 0 1.1481 3.6956 0 1.5308
  [4,16,2.8284,0,2.8284,2.1213,0,2.1213,2.7717,0,1.1481,3.6956,0,1.5308],
// 4 16 1.5308 0 3.6956 1.1481 0 2.7717 2.1213 0 2.1213 2.8284 0 2.8284
  [4,16,1.5308,0,3.6956,1.1481,0,2.7717,2.1213,0,2.1213,2.8284,0,2.8284],
// 4 16 0 0 4 0 0 3 1.1481 0 2.7717 1.5308 0 3.6956
  [4,16,0,0,4,0,0,3,1.1481,0,2.7717,1.5308,0,3.6956],
// 0
];
module ldraw_lib__4_4ring3(step=0, col=false, unit=2/5, alt=false, line=0.2, solid=!$preview)
    makepoly(ldraw_lib__4_4ring3(solid), step=step, col=col, unit=unit, alt=alt, line=line, solid=solid);
ldraw_lib__4_4ring3(line=0.2);
// file: ../p/4-4edge.scad
use <../lib.scad>
$fa=1; $fs=0.2;
function ldraw_lib__4_4edge(realsolid=false) = [
// 0 Circle 1.0
// 0 Name: 4-4edge.dat
// 0 Author: James Jessiman
// 0 !LDRAW_ORG Primitive UPDATE 2017-01
// 0 !LICENSE Licensed under CC BY 2.0 and CC BY 4.0 : see CAreadme.txt
// 
// 0 BFC CERTIFY CCW
  [0,"BFC","CERTIFY"],
  [0,"BFC","CCW"],
// 
// 0 !HISTORY 1998-12-15 [PTadmin] Official Update 1998-10
// 0 !HISTORY 2005-12-28 [PTadmin] Official Update 2005-01
// 0 !HISTORY 2007-06-24 [PTadmin] Header formatted for Contributor Agreement
// 0 !HISTORY 2008-07-01 [PTadmin] Official Update 2008-01
// 0 !HISTORY 2017-01-15 [Steffen] BFCed
// 0 !HISTORY 2017-12-30 [PTadmin] Official Update 2017-01
// 
// 
// 2 24 1 0 0 0.9239 0 0.3827
  [2,24,1,0,0,0.9239,0,0.3827],
// 2 24 0.9239 0 0.3827 0.7071 0 0.7071
  [2,24,0.9239,0,0.3827,0.7071,0,0.7071],
// 2 24 0.7071 0 0.7071 0.3827 0 0.9239
  [2,24,0.7071,0,0.7071,0.3827,0,0.9239],
// 2 24 0.3827 0 0.9239 0 0 1
  [2,24,0.3827,0,0.9239,0,0,1],
// 2 24 0 0 1 -0.3827 0 0.9239
  [2,24,0,0,1,-0.3827,0,0.9239],
// 2 24 -0.3827 0 0.9239 -0.7071 0 0.7071
  [2,24,-0.3827,0,0.9239,-0.7071,0,0.7071],
// 2 24 -0.7071 0 0.7071 -0.9239 0 0.3827
  [2,24,-0.7071,0,0.7071,-0.9239,0,0.3827],
// 2 24 -0.9239 0 0.3827 -1 0 -0
  [2,24,-0.9239,0,0.3827,-1,0,-0],
// 2 24 -1 0 -0 -0.9239 0 -0.3827
  [2,24,-1,0,-0,-0.9239,0,-0.3827],
// 2 24 -0.9239 0 -0.3827 -0.7071 0 -0.7071
  [2,24,-0.9239,0,-0.3827,-0.7071,0,-0.7071],
// 2 24 -0.7071 0 -0.7071 -0.3827 0 -0.9239
  [2,24,-0.7071,0,-0.7071,-0.3827,0,-0.9239],
// 2 24 -0.3827 0 -0.9239 0 0 -1
  [2,24,-0.3827,0,-0.9239,0,0,-1],
// 2 24 0 0 -1 0.3827 0 -0.9239
  [2,24,0,0,-1,0.3827,0,-0.9239],
// 2 24 0.3827 0 -0.9239 0.7071 0 -0.7071
  [2,24,0.3827,0,-0.9239,0.7071,0,-0.7071],
// 2 24 0.7071 0 -0.7071 0.9239 0 -0.3827
  [2,24,0.7071,0,-0.7071,0.9239,0,-0.3827],
// 2 24 0.9239 0 -0.3827 1 0 0
  [2,24,0.9239,0,-0.3827,1,0,0],
];
module ldraw_lib__4_4edge(step=0, col=false, unit=2/5, alt=false, line=0.2, solid=!$preview)
    makepoly(ldraw_lib__4_4edge(solid), step=step, col=col, unit=unit, alt=alt, line=line, solid=solid);
ldraw_lib__4_4edge(line=0.2);
// file: 3004.scad
use <../lib.scad>
use <s/3004s01.scad>
$fa=1; $fs=0.2;
function ldraw_lib__3004(realsolid=false) = [
// 0 Brick  1 x  2
// 0 Name: 3004.dat
// 0 Author: James Jessiman
// 0 !LDRAW_ORG Part UPDATE 2022-05
// 0 !LICENSE Licensed under CC BY 2.0 and CC BY 4.0 : see CAreadme.txt
// 
// 0 BFC CERTIFY CCW
  [0,"BFC","CERTIFY"],
  [0,"BFC","CCW"],
// 
// 0 !HISTORY 2001-10-26 [PTadmin] Official Update 2001-01
// 0 !HISTORY 2002-05-07 {unknown} BFC Certification
// 0 !HISTORY 2002-06-11 [PTadmin] Official Update 2002-03
// 0 !HISTORY 2007-05-07 [PTadmin] Header formatted for Contributor Agreement
// 0 !HISTORY 2008-07-01 [PTadmin] Official Update 2008-01
// 0 !HISTORY 2022-08-04 [MagFors] Using subfile
// 0 !HISTORY 2022-09-15 [PTadmin] Official Update 2022-05
// 
// 
// 1 16 0 0 0 1 0 0 0 1 0 0 0 1 s\3004s01.dat
  [1,16,0,0,0,1,0,0,0,1,0,0,0,1, ldraw_lib__s__3004s01(realsolid)],
// 4 16 -20 24 -10 20 24 -10 20 0 -10 -20 0 -10
  [4,16,-20,24,-10,20,24,-10,20,0,-10,-20,0,-10],
];
module ldraw_lib__3004(step=0, col=false, unit=2/5, alt=false, line=0.2, solid=!$preview)
    makepoly(ldraw_lib__3004(solid), step=step, col=col, unit=unit, alt=alt, line=line, solid=solid);
ldraw_lib__3004(line=0.2);
// file: 71533k03.scad
use <../lib.scad>
use <../p/4-4cyli.scad>
$fa=1; $fs=0.2;
function ldraw_lib__71533k03(realsolid=false) = [
// 0 ~Technic Pneumatic Tube Segment
// 0 Name: 71533k03.dat
// 0 Author: Jaco van der Molen [Jaco]
// 0 !LDRAW_ORG Part Flexible_Section UPDATE 2020-01
// 0 !LICENSE Licensed under CC BY 2.0 and CC BY 4.0 : see CAreadme.txt
// 
// 0 BFC CERTIFY CW
  [0,"BFC","CERTIFY"],
  [0,"BFC","CW"],
// 
// 0 !HISTORY 2003-11-30 [Steffen] BFCed
// 0 !HISTORY 2009-12-29 [PTadmin] Official Update 2009-03
// 0 !HISTORY 2020-06-27 [PTadmin] Renamed from 166
// 0 !HISTORY 2020-06-28 [PTadmin] Official Update 2020-01
// 
// 
// 1 16 0 0 0 5 0 0 0 1 0 0 0 5 4-4cyli.dat
  [1,16,0,0,0,5,0,0,0,1,0,0,0,5, ldraw_lib__4_4cyli(realsolid)],
// 0 BFC INVERTNEXT
  [0,"BFC","INVERTNEXT"],
// 1 16 0 0 0 3 0 0 0 1 0 0 0 3 4-4cyli.dat
  [1,16,0,0,0,3,0,0,0,1,0,0,0,3, ldraw_lib__4_4cyli(realsolid)],
// 0
];
module ldraw_lib__71533k03(step=0, col=false, unit=2/5, alt=false, line=0.2, solid=!$preview)
    makepoly(ldraw_lib__71533k03(solid), step=step, col=col, unit=unit, alt=alt, line=line, solid=solid);
ldraw_lib__71533k03(line=0.2);
// file: 71533k02.scad
use <../lib.scad>
use <../p/4-4edge.scad>
use <../p/4-4ring3.scad>
use <../p/4-4ring4.scad>
$fa=1; $fs=0.2;
function ldraw_lib__71533k02(realsolid=false) = [
// 0 ~Technic Pneumatic Tube End (Non-Bulged)
// 0 Name: 71533k02.dat
// 0 Author: Steffen [Steffen]
// 0 !LDRAW_ORG Part Flexible_Section UPDATE 2020-01
// 0 !LICENSE Licensed under CC BY 2.0 and CC BY 4.0 : see CAreadme.txt
// 
// 0 BFC CERTIFY CCW
  [0,"BFC","CERTIFY"],
  [0,"BFC","CCW"],
// 
// 0 !HISTORY 2020-06-28 [PTadmin] Official Update 2020-01
// 
// 
// 0 // This file goes together with 71533k01.dat and 71533k03.dat.
// 0 // Those 3 files can be used to create Technic Pneumatic Tubes
// 0 // with either bulged or non-bulged ends.
// 
// 1 16 0 0 0 1 0 0 0 1 0 0 0 1 4-4ring3.dat
  [1,16,0,0,0,1,0,0,0,1,0,0,0,1, ldraw_lib__4_4ring3(realsolid)],
// 1 16 0 0 0 1 0 0 0 1 0 0 0 1 4-4ring4.dat
  [1,16,0,0,0,1,0,0,0,1,0,0,0,1, ldraw_lib__4_4ring4(realsolid)],
// 1 16 0 0 0 3 0 0 0 3 0 0 0 3 4-4edge.dat
  [1,16,0,0,0,3,0,0,0,3,0,0,0,3, ldraw_lib__4_4edge(realsolid)],
// 1 16 0 0 0 5 0 0 0 5 0 0 0 5 4-4edge.dat
  [1,16,0,0,0,5,0,0,0,5,0,0,0,5, ldraw_lib__4_4edge(realsolid)],
];
module ldraw_lib__71533k02(step=0, col=false, unit=2/5, alt=false, line=0.2, solid=!$preview)
    makepoly(ldraw_lib__71533k02(solid), step=step, col=col, unit=unit, alt=alt, line=line, solid=solid);
ldraw_lib__71533k02(line=0.2);
// main file
use <../lib.scad>
use <71533k02.scad>
use <71533k03.scad>
$fa=1; $fs=0.2;
function ldraw_lib__21826_f1(realsolid=false) = [
// 0 Technic Pneumatic Tube  9L
// 0 Name: 21826-f1.dat
// 0 Author: Philippe Hurbain [Philo]
// 0 !LDRAW_ORG Part UPDATE 2020-01
// 0 !LICENSE Licensed under CC BY 2.0 and CC BY 4.0 : see CAreadme.txt
// 
// 0 BFC CERTIFY CCW
  [0,"BFC","CERTIFY"],
  [0,"BFC","CCW"],
// 
// 0 !KEYWORDS 72 mm
// 
// 0 !HISTORY 2020-06-28 [PTadmin] Official Update 2020-01
// 
// 
// 1 16 -90 0 0 0 1 0 1 0 0 0 0 1 71533k02.dat
  [1,16,-90,0,0,0,1,0,1,0,0,0,0,1, ldraw_lib__71533k02(realsolid)],
// 1 16 90 0 0 0 -1 0 -1 0 0 0 0 1 71533k02.dat
  [1,16,90,0,0,0,-1,0,-1,0,0,0,0,1, ldraw_lib__71533k02(realsolid)],
// 1 16 -90 0 0 0 180 0 1 0 0 0 0 1 71533k03.dat
  [1,16,-90,0,0,0,180,0,1,0,0,0,0,1, ldraw_lib__71533k03(realsolid)],
];
module ldraw_lib__21826_f1(step=0, col=false, unit=2/5, alt=false, line=0.2, solid=!$preview)
    makepoly(ldraw_lib__21826_f1(solid), step=step, col=col, unit=unit, alt=alt, line=line, solid=solid);
ldraw_lib__21826_f1(line=0.2);
